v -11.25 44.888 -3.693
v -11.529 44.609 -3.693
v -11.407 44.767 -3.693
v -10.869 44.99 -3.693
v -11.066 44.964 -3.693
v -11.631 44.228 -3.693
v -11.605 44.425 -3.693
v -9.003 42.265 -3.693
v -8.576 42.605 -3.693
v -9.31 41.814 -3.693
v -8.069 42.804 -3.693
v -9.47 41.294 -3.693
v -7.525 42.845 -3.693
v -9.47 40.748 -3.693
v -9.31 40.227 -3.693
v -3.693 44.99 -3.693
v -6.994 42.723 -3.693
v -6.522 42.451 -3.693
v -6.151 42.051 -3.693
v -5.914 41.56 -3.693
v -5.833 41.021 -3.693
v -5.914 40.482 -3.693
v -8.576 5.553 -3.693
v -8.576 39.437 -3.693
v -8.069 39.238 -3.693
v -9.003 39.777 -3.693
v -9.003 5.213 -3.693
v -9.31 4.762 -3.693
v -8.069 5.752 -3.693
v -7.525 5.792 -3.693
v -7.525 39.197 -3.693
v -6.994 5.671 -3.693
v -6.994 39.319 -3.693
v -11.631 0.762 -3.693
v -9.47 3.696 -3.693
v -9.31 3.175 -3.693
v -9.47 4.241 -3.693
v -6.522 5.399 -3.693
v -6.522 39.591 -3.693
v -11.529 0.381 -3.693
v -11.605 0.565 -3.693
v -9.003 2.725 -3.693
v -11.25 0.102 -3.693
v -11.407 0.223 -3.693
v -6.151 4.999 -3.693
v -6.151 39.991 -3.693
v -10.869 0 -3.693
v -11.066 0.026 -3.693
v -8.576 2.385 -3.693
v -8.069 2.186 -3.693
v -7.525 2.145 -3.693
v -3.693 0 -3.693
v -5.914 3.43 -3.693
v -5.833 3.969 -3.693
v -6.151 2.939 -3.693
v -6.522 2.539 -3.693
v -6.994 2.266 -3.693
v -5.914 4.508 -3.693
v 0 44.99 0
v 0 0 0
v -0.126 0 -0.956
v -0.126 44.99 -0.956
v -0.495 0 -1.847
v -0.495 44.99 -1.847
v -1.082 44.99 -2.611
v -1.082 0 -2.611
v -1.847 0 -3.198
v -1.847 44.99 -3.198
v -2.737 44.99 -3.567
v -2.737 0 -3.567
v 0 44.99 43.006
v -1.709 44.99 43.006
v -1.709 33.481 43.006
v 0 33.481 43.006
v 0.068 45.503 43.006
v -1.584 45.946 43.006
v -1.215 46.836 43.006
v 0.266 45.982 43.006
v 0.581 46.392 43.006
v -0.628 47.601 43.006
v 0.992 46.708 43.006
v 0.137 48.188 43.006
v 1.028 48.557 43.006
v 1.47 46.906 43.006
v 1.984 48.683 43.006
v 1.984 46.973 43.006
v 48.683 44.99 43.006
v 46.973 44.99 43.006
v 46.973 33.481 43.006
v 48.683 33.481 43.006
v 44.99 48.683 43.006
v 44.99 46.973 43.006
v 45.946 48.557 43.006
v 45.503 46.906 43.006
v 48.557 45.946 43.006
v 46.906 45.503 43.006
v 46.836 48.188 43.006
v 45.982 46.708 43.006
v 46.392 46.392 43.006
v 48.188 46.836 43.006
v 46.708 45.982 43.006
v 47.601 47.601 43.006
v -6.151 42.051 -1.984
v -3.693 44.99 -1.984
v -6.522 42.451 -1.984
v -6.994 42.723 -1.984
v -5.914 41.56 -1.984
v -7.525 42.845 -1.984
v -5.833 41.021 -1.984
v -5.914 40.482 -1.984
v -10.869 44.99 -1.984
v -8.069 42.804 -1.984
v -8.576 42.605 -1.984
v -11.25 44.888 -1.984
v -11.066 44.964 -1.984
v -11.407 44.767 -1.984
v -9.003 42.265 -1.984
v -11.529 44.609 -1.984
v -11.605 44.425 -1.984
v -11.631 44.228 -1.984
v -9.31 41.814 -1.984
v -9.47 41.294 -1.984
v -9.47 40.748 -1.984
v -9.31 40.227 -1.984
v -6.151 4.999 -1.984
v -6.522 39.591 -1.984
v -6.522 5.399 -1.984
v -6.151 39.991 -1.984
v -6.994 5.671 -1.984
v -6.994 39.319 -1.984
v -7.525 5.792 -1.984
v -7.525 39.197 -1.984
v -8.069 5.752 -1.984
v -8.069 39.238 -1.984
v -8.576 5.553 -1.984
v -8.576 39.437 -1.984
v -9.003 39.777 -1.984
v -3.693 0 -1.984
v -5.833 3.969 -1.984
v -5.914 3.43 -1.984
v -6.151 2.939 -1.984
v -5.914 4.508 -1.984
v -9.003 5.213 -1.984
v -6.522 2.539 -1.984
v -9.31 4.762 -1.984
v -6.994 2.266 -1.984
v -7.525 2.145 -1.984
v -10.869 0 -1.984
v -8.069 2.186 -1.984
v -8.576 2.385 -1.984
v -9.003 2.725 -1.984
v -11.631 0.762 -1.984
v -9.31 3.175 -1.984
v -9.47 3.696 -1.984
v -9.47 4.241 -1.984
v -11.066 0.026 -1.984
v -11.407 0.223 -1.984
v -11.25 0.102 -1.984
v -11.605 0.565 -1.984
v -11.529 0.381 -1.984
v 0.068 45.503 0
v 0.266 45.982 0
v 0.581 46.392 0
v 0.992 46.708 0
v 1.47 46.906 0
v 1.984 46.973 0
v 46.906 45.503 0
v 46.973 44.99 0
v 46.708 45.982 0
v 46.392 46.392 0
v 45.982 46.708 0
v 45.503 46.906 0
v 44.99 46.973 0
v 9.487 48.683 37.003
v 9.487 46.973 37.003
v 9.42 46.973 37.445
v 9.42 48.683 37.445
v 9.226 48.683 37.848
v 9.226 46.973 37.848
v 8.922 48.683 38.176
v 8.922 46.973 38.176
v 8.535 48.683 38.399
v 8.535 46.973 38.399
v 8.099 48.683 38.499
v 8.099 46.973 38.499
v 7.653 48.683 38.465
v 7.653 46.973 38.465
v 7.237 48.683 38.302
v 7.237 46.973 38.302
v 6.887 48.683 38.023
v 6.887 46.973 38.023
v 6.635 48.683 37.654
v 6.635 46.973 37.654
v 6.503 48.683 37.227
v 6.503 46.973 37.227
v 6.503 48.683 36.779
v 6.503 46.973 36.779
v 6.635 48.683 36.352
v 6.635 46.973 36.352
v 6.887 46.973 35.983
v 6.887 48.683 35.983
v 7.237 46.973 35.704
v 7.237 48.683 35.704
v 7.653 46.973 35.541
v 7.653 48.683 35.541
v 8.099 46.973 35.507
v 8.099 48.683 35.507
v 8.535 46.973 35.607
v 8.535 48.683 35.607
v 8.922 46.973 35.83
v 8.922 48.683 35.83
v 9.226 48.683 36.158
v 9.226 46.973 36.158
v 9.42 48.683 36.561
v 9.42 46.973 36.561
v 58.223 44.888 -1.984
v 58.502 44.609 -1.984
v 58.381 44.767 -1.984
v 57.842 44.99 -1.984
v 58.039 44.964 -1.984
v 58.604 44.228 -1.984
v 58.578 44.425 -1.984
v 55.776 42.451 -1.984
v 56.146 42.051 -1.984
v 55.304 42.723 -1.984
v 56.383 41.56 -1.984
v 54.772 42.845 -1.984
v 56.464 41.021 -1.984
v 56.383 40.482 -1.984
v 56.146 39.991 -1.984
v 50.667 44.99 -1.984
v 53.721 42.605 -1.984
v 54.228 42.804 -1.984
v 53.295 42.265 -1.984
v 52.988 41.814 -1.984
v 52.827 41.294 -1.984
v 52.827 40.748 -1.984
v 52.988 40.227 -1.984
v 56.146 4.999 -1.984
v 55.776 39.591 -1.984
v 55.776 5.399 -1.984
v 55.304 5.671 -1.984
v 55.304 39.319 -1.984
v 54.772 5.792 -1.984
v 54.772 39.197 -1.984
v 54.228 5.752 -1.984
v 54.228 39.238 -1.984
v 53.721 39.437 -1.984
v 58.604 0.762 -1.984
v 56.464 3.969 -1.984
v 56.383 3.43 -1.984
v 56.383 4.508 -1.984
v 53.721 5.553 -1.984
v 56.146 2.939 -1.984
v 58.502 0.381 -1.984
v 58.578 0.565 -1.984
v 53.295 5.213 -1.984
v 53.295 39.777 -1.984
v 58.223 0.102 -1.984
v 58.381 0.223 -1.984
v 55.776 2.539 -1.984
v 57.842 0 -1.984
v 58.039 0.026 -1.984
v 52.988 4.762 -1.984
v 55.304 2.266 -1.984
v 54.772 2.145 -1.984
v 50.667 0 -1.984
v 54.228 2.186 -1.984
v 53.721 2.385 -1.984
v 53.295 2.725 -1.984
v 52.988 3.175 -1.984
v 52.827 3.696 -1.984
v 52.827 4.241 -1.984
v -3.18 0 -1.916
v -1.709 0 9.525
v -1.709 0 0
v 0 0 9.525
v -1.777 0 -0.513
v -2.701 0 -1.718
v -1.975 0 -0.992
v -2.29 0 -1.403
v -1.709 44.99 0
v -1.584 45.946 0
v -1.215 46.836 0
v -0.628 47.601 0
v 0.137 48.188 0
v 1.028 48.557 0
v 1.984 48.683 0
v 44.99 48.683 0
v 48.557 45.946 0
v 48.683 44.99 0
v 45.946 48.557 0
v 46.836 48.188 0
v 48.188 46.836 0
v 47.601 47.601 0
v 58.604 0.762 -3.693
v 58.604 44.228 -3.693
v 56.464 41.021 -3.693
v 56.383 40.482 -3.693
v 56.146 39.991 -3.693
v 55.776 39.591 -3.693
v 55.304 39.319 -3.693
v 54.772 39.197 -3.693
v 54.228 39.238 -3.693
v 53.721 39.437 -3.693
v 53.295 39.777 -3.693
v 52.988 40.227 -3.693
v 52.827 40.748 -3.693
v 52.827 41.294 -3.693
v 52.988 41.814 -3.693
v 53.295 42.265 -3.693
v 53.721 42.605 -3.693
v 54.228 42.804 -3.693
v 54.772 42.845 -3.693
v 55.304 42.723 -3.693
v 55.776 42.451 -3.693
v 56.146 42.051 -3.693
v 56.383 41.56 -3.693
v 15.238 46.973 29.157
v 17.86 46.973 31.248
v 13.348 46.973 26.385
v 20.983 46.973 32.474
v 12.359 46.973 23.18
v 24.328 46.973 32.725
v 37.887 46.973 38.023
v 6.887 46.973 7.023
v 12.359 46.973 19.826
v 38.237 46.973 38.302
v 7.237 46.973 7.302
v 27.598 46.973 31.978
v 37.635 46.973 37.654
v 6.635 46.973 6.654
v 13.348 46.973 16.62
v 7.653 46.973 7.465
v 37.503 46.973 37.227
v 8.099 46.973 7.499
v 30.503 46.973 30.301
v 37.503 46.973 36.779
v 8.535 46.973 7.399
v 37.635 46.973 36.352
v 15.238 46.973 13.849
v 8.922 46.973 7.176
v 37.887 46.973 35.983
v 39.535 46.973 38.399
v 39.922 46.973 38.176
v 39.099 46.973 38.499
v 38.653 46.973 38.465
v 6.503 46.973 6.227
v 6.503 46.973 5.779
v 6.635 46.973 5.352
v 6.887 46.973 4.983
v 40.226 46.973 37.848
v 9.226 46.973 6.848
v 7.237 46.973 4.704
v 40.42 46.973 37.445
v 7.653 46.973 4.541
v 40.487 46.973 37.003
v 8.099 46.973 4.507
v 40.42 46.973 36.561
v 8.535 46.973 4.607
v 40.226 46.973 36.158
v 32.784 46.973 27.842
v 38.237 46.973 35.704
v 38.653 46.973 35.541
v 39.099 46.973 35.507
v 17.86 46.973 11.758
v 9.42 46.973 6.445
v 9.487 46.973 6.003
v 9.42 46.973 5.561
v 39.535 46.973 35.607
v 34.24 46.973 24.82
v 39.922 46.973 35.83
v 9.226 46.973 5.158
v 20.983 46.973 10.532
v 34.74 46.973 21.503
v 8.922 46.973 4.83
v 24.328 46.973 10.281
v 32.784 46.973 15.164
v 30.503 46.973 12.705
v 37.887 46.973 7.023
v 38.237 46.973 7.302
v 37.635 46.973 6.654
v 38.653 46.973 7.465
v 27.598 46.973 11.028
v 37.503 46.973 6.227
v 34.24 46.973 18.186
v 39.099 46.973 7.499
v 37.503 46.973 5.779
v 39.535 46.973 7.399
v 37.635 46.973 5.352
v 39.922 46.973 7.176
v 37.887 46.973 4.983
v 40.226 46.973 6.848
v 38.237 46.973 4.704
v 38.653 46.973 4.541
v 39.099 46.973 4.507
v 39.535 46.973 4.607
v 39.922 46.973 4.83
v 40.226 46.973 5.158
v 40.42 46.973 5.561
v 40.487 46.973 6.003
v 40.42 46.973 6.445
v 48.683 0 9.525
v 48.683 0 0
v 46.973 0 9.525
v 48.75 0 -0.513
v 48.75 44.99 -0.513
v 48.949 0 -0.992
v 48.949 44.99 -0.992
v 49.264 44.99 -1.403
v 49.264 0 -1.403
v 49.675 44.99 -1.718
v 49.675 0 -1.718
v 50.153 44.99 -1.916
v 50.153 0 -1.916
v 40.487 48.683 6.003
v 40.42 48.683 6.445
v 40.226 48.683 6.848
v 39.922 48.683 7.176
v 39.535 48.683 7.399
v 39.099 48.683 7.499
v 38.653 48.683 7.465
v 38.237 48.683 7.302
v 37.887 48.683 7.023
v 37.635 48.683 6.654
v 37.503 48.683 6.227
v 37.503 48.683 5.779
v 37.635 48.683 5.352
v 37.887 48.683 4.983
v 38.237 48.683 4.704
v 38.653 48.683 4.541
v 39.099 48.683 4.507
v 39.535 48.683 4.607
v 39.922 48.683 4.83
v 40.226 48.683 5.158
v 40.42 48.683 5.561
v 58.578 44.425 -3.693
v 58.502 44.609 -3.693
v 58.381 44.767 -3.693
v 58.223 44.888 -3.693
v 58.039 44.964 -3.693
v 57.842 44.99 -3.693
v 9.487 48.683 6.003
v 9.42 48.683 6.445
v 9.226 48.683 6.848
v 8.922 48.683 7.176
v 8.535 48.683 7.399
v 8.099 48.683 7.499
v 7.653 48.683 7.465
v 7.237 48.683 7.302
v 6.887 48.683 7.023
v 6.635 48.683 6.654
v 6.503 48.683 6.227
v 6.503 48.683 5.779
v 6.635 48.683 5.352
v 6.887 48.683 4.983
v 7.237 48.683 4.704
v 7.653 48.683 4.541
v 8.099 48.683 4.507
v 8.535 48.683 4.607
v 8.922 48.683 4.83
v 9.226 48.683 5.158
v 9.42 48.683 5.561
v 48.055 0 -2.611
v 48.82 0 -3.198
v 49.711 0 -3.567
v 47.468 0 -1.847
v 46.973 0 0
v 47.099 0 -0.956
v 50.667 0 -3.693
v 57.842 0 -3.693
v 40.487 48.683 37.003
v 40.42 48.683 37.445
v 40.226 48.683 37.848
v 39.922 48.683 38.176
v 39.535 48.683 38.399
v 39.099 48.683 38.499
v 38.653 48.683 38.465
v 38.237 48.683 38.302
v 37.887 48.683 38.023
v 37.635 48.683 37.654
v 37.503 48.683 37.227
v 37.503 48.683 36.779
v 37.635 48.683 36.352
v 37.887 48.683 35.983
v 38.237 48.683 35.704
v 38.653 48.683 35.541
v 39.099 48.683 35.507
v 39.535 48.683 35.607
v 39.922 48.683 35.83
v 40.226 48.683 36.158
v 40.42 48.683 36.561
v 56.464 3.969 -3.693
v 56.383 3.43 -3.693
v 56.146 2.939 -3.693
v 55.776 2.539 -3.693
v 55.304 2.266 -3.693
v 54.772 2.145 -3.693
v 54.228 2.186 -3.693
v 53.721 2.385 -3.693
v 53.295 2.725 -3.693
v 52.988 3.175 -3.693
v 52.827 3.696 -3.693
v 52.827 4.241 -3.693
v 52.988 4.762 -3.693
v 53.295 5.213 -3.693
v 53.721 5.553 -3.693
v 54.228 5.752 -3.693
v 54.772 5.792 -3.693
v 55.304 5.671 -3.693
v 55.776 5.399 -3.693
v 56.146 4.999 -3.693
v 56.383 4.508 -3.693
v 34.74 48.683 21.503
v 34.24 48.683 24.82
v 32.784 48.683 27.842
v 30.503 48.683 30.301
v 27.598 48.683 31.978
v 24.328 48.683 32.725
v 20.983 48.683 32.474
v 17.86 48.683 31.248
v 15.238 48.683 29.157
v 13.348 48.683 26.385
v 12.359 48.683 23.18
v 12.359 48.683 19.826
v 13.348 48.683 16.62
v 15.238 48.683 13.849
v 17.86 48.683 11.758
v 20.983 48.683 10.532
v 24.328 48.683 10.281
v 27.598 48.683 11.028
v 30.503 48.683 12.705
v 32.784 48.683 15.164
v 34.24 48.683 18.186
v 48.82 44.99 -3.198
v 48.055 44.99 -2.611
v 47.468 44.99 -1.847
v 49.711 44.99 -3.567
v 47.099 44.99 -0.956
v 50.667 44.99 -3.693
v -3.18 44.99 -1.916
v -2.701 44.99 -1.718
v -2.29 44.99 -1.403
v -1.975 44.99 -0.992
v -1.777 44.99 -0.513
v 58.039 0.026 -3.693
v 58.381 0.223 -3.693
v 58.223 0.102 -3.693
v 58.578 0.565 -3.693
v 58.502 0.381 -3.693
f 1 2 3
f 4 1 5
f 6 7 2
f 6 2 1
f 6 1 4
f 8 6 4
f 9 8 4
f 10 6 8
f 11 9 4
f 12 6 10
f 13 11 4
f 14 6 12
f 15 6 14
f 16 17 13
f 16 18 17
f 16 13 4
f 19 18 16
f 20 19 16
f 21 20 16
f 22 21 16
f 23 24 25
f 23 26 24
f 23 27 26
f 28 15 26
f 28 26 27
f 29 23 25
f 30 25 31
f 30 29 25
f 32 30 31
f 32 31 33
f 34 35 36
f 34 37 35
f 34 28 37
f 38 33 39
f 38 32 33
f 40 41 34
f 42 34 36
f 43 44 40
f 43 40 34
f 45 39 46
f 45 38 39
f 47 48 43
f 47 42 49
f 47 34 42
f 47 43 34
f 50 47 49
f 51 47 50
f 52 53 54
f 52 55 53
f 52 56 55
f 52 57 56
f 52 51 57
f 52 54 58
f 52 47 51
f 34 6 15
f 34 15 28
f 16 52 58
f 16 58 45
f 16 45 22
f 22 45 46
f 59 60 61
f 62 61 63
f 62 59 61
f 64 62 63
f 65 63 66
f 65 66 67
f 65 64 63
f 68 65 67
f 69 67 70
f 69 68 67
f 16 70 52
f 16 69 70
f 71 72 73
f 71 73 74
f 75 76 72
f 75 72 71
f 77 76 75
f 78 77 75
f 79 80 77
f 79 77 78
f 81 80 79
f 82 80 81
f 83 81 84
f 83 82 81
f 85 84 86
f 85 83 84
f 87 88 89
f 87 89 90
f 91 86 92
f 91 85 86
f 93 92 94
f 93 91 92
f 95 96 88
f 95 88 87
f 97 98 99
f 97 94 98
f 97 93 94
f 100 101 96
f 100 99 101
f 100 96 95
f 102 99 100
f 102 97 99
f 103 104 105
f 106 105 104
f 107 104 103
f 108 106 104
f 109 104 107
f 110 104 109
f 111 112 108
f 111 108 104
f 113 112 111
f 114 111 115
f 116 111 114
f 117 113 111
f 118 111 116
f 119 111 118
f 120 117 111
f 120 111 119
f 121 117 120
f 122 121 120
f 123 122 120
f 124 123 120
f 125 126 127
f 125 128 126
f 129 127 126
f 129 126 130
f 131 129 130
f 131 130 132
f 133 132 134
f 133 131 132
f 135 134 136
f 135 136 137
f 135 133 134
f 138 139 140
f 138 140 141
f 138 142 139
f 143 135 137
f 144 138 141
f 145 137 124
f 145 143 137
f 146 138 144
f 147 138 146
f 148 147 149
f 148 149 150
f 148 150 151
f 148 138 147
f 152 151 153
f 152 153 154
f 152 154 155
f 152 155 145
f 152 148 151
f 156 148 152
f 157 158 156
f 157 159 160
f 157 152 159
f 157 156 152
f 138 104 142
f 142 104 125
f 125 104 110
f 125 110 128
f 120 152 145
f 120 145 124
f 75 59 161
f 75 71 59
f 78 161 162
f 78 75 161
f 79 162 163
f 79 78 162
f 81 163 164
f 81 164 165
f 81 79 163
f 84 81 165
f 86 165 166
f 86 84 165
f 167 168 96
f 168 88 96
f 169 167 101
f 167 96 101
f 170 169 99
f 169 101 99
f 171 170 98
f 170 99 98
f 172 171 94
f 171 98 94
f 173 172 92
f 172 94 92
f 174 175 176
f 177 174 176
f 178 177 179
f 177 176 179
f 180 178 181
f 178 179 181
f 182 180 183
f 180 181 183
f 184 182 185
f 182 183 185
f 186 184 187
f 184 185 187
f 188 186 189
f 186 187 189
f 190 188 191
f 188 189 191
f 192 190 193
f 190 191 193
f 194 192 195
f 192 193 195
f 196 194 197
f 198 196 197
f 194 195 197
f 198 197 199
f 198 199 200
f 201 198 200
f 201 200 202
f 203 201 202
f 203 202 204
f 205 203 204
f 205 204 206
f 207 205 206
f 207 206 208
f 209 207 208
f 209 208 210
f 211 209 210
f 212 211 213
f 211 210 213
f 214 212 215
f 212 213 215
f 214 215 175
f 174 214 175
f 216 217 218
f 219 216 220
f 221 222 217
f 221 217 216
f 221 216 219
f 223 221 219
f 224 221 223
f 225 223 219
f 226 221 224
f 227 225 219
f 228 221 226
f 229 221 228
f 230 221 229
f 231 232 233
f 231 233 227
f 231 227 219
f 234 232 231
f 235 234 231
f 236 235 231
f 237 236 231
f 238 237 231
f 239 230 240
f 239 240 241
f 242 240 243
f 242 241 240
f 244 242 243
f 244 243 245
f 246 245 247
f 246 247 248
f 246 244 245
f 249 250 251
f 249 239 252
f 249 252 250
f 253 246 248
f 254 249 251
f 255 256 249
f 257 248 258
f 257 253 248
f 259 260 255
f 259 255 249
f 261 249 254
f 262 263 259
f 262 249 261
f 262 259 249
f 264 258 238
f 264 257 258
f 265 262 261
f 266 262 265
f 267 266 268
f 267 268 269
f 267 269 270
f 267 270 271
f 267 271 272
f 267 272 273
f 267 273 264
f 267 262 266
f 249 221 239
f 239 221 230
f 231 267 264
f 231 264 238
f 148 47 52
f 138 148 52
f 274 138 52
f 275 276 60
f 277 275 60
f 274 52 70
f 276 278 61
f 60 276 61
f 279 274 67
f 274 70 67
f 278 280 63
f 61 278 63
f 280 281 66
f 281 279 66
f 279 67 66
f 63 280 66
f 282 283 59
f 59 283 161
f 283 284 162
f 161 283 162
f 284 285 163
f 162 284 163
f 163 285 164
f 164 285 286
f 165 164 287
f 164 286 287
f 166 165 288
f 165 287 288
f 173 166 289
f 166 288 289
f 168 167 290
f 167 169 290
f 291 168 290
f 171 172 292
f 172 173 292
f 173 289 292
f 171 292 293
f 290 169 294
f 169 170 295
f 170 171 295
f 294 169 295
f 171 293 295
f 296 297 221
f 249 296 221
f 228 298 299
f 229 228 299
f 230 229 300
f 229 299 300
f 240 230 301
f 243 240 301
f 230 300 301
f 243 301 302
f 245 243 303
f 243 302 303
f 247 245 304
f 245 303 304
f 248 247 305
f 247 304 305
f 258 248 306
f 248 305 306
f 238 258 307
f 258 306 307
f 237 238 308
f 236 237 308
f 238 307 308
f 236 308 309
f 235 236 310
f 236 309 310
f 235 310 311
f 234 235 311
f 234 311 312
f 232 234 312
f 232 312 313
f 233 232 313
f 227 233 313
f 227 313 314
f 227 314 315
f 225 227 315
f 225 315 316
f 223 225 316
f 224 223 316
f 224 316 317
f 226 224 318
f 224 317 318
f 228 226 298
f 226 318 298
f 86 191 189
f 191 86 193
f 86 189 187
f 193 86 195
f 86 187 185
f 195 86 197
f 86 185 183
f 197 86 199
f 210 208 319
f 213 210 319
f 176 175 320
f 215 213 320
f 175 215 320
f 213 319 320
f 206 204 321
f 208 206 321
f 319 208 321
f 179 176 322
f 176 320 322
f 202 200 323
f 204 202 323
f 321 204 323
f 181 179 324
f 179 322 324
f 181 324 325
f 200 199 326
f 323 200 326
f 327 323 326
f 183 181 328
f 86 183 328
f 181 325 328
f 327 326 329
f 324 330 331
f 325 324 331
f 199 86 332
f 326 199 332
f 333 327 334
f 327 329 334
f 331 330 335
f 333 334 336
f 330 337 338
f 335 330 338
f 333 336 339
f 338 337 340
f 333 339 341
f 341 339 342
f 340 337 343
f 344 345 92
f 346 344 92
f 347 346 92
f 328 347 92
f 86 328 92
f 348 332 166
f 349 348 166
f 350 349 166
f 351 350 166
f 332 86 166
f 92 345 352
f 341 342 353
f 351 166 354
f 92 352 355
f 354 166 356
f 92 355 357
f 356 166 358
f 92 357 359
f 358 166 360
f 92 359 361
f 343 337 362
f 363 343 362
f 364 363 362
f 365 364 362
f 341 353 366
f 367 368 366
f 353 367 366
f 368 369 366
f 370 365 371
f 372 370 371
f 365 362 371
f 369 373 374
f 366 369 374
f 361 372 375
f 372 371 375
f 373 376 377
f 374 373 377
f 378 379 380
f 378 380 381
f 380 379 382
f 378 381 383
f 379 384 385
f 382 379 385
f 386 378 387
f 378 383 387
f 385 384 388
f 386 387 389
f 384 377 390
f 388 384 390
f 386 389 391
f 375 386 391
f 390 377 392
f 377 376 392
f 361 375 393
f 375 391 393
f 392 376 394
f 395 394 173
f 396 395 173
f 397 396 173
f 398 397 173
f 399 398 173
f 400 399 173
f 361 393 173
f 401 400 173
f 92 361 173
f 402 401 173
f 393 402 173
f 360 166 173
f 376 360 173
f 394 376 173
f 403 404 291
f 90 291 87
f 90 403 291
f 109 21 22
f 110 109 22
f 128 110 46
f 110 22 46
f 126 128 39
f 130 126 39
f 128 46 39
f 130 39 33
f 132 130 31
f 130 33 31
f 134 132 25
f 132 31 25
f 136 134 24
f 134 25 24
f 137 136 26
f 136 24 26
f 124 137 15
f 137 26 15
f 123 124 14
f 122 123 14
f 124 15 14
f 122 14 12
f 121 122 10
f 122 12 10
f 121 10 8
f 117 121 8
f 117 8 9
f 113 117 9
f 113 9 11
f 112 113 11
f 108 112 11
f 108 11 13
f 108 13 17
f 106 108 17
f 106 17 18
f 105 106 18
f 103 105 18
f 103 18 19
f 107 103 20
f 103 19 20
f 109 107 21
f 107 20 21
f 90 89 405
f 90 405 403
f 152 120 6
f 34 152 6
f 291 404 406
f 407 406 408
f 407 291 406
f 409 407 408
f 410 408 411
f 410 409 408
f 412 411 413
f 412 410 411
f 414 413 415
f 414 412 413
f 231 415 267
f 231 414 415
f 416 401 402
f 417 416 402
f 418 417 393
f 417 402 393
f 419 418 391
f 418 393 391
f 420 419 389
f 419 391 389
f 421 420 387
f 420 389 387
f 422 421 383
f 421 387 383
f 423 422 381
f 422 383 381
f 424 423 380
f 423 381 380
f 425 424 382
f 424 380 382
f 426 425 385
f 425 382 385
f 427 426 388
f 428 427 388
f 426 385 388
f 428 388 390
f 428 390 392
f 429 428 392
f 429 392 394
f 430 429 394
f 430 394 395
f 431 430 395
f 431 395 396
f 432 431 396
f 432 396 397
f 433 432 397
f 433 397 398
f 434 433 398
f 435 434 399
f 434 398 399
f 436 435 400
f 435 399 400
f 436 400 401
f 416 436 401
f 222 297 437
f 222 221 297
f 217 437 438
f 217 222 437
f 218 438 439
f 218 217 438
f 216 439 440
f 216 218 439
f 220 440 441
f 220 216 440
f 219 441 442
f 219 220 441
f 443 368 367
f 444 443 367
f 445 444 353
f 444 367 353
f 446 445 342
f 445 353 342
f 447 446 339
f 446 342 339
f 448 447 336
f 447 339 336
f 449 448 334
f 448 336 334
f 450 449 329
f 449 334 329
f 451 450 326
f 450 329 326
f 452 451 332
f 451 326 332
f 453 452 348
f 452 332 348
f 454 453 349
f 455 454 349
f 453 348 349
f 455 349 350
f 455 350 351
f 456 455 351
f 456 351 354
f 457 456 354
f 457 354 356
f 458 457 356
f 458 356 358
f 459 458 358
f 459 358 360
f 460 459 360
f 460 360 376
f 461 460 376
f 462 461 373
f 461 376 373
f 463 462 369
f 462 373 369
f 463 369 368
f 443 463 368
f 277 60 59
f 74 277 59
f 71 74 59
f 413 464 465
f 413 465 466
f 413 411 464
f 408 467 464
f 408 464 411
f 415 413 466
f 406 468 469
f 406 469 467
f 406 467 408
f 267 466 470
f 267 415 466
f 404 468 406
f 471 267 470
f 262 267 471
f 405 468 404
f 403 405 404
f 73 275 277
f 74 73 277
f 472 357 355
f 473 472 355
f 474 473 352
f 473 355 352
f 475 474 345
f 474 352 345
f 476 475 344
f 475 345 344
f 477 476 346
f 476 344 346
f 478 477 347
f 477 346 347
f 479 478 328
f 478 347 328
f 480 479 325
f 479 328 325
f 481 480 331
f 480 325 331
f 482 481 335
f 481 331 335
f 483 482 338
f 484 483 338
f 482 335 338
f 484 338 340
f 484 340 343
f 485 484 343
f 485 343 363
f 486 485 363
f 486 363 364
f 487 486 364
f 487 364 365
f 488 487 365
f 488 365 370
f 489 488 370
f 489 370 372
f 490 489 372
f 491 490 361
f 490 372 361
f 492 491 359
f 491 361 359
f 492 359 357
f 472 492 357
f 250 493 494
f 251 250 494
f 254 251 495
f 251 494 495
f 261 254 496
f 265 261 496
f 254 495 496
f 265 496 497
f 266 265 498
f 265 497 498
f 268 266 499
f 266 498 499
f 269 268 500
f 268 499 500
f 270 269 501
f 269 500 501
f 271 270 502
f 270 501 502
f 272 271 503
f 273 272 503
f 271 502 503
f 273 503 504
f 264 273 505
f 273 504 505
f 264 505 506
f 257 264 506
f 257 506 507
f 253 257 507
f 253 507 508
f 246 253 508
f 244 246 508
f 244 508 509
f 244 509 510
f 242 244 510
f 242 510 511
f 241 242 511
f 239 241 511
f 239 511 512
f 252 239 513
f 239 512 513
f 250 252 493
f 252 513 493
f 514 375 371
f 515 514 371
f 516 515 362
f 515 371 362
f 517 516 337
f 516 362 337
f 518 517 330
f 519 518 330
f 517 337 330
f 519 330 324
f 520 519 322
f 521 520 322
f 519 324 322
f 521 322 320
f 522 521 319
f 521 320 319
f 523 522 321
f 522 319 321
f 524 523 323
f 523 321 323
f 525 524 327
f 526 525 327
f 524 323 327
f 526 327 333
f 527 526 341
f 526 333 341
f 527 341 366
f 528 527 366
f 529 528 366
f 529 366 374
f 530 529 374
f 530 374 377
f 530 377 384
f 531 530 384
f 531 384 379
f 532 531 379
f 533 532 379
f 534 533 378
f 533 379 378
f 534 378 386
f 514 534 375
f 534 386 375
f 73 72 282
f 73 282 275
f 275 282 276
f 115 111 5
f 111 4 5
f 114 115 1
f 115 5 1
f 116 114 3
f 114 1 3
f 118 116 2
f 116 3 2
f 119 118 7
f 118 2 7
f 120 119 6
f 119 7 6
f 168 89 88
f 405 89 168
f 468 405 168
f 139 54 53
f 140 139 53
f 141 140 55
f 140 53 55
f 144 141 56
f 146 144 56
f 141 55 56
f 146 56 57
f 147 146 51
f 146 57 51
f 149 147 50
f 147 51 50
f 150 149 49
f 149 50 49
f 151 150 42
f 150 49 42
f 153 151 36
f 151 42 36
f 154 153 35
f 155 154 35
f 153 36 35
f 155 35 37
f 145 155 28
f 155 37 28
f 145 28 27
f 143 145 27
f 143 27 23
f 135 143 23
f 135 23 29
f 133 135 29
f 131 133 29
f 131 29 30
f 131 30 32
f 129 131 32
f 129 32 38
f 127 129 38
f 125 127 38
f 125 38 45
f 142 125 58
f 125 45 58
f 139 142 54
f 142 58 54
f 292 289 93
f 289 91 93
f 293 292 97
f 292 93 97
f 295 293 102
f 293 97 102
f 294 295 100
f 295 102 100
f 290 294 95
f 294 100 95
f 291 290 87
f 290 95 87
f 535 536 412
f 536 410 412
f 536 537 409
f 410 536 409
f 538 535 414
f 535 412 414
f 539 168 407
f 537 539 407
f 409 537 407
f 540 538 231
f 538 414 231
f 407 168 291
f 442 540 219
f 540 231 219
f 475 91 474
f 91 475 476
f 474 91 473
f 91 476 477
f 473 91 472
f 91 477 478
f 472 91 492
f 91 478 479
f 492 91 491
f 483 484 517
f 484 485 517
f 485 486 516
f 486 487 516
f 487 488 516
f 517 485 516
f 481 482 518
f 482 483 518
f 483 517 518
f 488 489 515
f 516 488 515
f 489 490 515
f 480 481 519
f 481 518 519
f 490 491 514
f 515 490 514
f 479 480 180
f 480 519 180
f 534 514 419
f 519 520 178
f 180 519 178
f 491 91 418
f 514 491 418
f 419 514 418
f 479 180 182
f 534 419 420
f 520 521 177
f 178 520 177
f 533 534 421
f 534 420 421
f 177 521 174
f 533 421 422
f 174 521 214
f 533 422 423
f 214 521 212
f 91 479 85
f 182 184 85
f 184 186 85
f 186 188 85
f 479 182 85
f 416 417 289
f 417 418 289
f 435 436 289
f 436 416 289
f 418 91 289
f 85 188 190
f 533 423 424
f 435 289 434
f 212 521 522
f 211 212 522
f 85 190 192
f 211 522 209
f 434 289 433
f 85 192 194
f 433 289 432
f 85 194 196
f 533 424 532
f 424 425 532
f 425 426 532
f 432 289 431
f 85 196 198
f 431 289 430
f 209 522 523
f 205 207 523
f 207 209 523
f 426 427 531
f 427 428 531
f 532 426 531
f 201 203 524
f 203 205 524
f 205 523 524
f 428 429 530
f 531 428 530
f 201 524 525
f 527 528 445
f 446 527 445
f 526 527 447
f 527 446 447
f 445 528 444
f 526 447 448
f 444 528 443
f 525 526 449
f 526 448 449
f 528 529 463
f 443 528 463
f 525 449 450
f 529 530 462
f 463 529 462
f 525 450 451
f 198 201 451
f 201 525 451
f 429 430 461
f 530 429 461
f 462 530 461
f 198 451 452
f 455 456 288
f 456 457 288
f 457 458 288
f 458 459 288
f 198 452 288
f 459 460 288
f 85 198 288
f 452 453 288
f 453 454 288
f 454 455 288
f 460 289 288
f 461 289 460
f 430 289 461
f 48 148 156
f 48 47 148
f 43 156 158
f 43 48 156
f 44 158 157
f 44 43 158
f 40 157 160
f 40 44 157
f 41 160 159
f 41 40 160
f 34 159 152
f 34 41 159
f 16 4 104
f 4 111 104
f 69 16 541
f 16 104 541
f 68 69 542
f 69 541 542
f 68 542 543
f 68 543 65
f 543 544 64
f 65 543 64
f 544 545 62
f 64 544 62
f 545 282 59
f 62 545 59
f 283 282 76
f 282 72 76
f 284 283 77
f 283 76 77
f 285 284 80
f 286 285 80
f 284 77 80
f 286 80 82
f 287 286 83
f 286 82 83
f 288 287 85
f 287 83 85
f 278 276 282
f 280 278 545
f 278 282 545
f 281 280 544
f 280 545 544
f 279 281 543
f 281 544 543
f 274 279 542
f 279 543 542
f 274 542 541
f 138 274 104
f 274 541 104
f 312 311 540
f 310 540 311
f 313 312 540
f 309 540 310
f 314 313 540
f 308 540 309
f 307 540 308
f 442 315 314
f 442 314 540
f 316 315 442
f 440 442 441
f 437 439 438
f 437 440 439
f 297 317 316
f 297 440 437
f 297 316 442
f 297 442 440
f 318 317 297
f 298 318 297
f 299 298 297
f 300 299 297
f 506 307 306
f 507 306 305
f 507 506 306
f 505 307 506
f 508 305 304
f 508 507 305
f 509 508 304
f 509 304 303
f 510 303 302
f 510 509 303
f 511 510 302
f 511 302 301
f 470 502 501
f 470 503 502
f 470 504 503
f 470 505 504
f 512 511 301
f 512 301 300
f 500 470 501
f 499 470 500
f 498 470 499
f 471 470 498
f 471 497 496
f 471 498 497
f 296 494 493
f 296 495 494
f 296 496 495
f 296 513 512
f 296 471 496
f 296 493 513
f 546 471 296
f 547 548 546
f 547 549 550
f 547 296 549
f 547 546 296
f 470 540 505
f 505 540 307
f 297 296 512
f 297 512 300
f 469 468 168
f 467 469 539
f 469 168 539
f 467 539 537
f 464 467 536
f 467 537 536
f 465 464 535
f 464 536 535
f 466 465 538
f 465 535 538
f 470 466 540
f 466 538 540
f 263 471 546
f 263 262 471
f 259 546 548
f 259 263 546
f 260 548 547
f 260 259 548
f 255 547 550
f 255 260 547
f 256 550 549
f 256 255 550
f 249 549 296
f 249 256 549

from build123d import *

# Parameters (mm, degrees)
F1_DEPTH  = 43.0059846
F4_DEPTH  = 44.9897246
F5_R      = 1.98374
F6_R      = 3.69316
F7_SIZE   = 33.4809846
F8_R      = 11.2530001
F8_R_2    = 1.5
F9_DEPTH  = 1.70942
F10_R     = 1.8288
F11_DEPTH = 1.70942
F12_R     = 0.762


with BuildPart() as f1:
    # F0 (on Top) → F1 (new body)
    with BuildSketch(Plane.XY):
        Polygon((-1.70942, 0), (0, 0), (0, 46.9734646), (46.9734646, 46.9734646), (46.9734646, 0), (48.6828846, 0), (48.6828846, 48.6828846), (-1.70942, 48.6828846), align=None)
    extrude(amount=F1_DEPTH)

    # F3 (on face) → F4 (join, through all)
    with BuildSketch(Plane.XZ):
        Polygon((48.6828846, 0), (46.9734646, 0), (46.9734646, -3.69316), (58.6041246, -3.69316), (58.6041246, -1.98374), (48.6828846, -1.98374), align=None)
        Polygon((0, 0), (-1.70942, 0), (-1.70942, -1.98374), (-11.63066, -1.98374), (-11.63066, -3.69316), (0, -3.69316), align=None)
    extrude(amount=-F4_DEPTH)

    # F5
    f5_edges = [f1.edges().sort_by_distance(p)[0] for p in [
        (0, 46.973465, 21.502992),
        (46.973465, 46.973465, 21.502992),
        (-1.70942, 22.494862, -1.98374),
        (48.682885, 22.494862, -1.98374),
    ]]
    fillet(f5_edges, radius=F5_R)

    # F6
    f6_edges = [f1.edges().sort_by_distance(p)[0] for p in [
        (48.682885, 48.682885, 21.502992),
        (-1.70942, 48.682885, 21.502992),
        (0, 22.494862, -3.69316),
        (46.973465, 22.494862, -3.69316),
    ]]
    fillet(f6_edges, radius=F6_R)

    # F7
    f7_edges = [f1.edges().sort_by_distance(p)[0] for p in [
        (-0.85471, 0, 43.005985),
        (47.828175, 0, 43.005985),
    ]]
    chamfer(f7_edges, length=F7_SIZE)

    # F8 (on face) → F9 (cut, through all)
    with BuildSketch(Plane.XZ.offset(-46.9734646)):
        with Locations((23.4867323, 21.5029923)):
            Circle(F8_R)
        with Locations((38.9867267, 37.0029867)):
            Circle(F8_R_2)
        with Locations((38.9867267, 6.0029979)):
            Circle(F8_R_2)
        with Locations((7.9867379, 6.0029979)):
            Circle(F8_R_2)
        with Locations((7.9867379, 37.0029867)):
            Circle(F8_R_2)
    extrude(amount=-F9_DEPTH, mode=Mode.SUBTRACT)

    # F10 (on face) → F11 (cut, through all)
    with BuildSketch(Plane(origin=(0, 0, -3.69316), x_dir=(1, 0, 0), z_dir=(0, 0, -1))):
        with Locations((54.6353746, -41.0209746001)):
            Circle(F10_R)
        with Locations((-7.66191, -41.0209746001)):
            Circle(F10_R)
        with Locations((-7.66191, -3.9687499999)):
            Circle(F10_R)
        with Locations((54.6353746, -3.9687499999)):
            Circle(F10_R)
    extrude(amount=-F11_DEPTH, mode=Mode.SUBTRACT)

    # F12
    f12_edges = [f1.edges().sort_by_distance(p)[0] for p in [
        (58.604125, 0, -2.83845),
        (-11.63066, 0, -2.83845),
        (-11.63066, 44.989725, -2.83845),
        (58.604125, 44.989725, -2.83845),
    ]]
    fillet(f12_edges, radius=F12_R)


solid = f1.part
